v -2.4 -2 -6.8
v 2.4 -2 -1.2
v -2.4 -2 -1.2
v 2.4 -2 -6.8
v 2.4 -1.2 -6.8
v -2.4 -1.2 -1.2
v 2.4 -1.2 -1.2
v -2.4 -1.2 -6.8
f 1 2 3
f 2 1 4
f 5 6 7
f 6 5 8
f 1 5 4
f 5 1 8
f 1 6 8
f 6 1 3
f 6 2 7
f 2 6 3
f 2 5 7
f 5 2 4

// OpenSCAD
// file: ../p/box.scad
use <../lib.scad>
function ldraw_lib__box() = [
// 0 Box 6 (six faces)
// 0 Name: box.dat
// 0 Author: James Jessiman
// 0 !LDRAW_ORG Primitive UPDATE 2002-05
// 0 !LICENSE Licensed under CC BY 2.0 and CC BY 4.0 : see CAreadme.txt
// 
// 0 BFC CERTIFY CCW
  [0,"BFC","CERTIFY"],
  [0,"BFC","CCW"],
// 
// 0 !HISTORY 2002-08-22 [sbliss] Applied BFC
// 0 !HISTORY 2002-11-30 [PTadmin] Official Update 2002-05
// 0 !HISTORY 2007-06-24 [PTadmin] Header formatted for Contributor Agreement
// 0 !HISTORY 2008-07-01 [PTadmin] Official Update 2008-01
// 
// 
// 2 24 1 1 1 -1 1 1
  [2,24,1,1,1,-1,1,1],
// 2 24 -1 1 1 -1 1 -1
  [2,24,-1,1,1,-1,1,-1],
// 2 24 -1 1 -1 1 1 -1
  [2,24,-1,1,-1,1,1,-1],
// 2 24 1 1 -1 1 1 1
  [2,24,1,1,-1,1,1,1],
// 2 24 1 -1 1 -1 -1 1
  [2,24,1,-1,1,-1,-1,1],
// 2 24 -1 -1 1 -1 -1 -1
  [2,24,-1,-1,1,-1,-1,-1],
// 2 24 -1 -1 -1 1 -1 -1
  [2,24,-1,-1,-1,1,-1,-1],
// 2 24 1 -1 -1 1 -1 1
  [2,24,1,-1,-1,1,-1,1],
// 2 24 1 -1 1 1 1 1
  [2,24,1,-1,1,1,1,1],
// 2 24 -1 -1 1 -1 1 1
  [2,24,-1,-1,1,-1,1,1],
// 2 24 1 -1 -1 1 1 -1
  [2,24,1,-1,-1,1,1,-1],
// 2 24 -1 -1 -1 -1 1 -1
  [2,24,-1,-1,-1,-1,1,-1],
// 4 16 1 1 1 1 1 -1 -1 1 -1 -1 1 1
  [4,16,1,1,1,1,1,-1,-1,1,-1,-1,1,1],
// 4 16 -1 -1 -1 1 -1 -1 1 -1 1 -1 -1 1
  [4,16,-1,-1,-1,1,-1,-1,1,-1,1,-1,-1,1],
// 4 16 -1 -1 1 1 -1 1 1 1 1 -1 1 1
  [4,16,-1,-1,1,1,-1,1,1,1,1,-1,1,1],
// 4 16 -1 -1 -1 -1 -1 1 -1 1 1 -1 1 -1
  [4,16,-1,-1,-1,-1,-1,1,-1,1,1,-1,1,-1],
// 4 16 1 -1 -1 -1 -1 -1 -1 1 -1 1 1 -1
  [4,16,1,-1,-1,-1,-1,-1,-1,1,-1,1,1,-1],
// 4 16 1 -1 1 1 -1 -1 1 1 -1 1 1 1
  [4,16,1,-1,1,1,-1,-1,1,1,-1,1,1,1],
// 0
];
makepoly(ldraw_lib__box(), line=0.2);
// main file
use <../lib.scad>
use <../p/box.scad>
function ldraw_lib__844() = [
// 0 ~Window  1 x  1 x  1 Classic Glass
// 0 Name: 844.dat
// 0 Author: Tore Eriksson [Tore_Eriksson]
// 0 !LDRAW_ORG Part UPDATE 2009-01
// 0 !LICENSE Licensed under CC BY 2.0 and CC BY 4.0 : see CAreadme.txt
// 
// 0 BFC CERTIFY CCW
  [0,"BFC","CERTIFY"],
  [0,"BFC","CCW"],
// 
// 0 !HISTORY 2006-04-17 [cwdee] Secondary author
// 0 !HISTORY 2009-05-02 [PTadmin] Official Update 2009-01
// 
// 
// 1 16 0 10 -4 6 0 0 0 0 7 0 -1 0 box.dat
  [1,16,0,10,-4,6,0,0,0,0,7,0,-1,0, ldraw_lib__box()],
// 0
// 
];
makepoly(ldraw_lib__844(), line=0.2);
